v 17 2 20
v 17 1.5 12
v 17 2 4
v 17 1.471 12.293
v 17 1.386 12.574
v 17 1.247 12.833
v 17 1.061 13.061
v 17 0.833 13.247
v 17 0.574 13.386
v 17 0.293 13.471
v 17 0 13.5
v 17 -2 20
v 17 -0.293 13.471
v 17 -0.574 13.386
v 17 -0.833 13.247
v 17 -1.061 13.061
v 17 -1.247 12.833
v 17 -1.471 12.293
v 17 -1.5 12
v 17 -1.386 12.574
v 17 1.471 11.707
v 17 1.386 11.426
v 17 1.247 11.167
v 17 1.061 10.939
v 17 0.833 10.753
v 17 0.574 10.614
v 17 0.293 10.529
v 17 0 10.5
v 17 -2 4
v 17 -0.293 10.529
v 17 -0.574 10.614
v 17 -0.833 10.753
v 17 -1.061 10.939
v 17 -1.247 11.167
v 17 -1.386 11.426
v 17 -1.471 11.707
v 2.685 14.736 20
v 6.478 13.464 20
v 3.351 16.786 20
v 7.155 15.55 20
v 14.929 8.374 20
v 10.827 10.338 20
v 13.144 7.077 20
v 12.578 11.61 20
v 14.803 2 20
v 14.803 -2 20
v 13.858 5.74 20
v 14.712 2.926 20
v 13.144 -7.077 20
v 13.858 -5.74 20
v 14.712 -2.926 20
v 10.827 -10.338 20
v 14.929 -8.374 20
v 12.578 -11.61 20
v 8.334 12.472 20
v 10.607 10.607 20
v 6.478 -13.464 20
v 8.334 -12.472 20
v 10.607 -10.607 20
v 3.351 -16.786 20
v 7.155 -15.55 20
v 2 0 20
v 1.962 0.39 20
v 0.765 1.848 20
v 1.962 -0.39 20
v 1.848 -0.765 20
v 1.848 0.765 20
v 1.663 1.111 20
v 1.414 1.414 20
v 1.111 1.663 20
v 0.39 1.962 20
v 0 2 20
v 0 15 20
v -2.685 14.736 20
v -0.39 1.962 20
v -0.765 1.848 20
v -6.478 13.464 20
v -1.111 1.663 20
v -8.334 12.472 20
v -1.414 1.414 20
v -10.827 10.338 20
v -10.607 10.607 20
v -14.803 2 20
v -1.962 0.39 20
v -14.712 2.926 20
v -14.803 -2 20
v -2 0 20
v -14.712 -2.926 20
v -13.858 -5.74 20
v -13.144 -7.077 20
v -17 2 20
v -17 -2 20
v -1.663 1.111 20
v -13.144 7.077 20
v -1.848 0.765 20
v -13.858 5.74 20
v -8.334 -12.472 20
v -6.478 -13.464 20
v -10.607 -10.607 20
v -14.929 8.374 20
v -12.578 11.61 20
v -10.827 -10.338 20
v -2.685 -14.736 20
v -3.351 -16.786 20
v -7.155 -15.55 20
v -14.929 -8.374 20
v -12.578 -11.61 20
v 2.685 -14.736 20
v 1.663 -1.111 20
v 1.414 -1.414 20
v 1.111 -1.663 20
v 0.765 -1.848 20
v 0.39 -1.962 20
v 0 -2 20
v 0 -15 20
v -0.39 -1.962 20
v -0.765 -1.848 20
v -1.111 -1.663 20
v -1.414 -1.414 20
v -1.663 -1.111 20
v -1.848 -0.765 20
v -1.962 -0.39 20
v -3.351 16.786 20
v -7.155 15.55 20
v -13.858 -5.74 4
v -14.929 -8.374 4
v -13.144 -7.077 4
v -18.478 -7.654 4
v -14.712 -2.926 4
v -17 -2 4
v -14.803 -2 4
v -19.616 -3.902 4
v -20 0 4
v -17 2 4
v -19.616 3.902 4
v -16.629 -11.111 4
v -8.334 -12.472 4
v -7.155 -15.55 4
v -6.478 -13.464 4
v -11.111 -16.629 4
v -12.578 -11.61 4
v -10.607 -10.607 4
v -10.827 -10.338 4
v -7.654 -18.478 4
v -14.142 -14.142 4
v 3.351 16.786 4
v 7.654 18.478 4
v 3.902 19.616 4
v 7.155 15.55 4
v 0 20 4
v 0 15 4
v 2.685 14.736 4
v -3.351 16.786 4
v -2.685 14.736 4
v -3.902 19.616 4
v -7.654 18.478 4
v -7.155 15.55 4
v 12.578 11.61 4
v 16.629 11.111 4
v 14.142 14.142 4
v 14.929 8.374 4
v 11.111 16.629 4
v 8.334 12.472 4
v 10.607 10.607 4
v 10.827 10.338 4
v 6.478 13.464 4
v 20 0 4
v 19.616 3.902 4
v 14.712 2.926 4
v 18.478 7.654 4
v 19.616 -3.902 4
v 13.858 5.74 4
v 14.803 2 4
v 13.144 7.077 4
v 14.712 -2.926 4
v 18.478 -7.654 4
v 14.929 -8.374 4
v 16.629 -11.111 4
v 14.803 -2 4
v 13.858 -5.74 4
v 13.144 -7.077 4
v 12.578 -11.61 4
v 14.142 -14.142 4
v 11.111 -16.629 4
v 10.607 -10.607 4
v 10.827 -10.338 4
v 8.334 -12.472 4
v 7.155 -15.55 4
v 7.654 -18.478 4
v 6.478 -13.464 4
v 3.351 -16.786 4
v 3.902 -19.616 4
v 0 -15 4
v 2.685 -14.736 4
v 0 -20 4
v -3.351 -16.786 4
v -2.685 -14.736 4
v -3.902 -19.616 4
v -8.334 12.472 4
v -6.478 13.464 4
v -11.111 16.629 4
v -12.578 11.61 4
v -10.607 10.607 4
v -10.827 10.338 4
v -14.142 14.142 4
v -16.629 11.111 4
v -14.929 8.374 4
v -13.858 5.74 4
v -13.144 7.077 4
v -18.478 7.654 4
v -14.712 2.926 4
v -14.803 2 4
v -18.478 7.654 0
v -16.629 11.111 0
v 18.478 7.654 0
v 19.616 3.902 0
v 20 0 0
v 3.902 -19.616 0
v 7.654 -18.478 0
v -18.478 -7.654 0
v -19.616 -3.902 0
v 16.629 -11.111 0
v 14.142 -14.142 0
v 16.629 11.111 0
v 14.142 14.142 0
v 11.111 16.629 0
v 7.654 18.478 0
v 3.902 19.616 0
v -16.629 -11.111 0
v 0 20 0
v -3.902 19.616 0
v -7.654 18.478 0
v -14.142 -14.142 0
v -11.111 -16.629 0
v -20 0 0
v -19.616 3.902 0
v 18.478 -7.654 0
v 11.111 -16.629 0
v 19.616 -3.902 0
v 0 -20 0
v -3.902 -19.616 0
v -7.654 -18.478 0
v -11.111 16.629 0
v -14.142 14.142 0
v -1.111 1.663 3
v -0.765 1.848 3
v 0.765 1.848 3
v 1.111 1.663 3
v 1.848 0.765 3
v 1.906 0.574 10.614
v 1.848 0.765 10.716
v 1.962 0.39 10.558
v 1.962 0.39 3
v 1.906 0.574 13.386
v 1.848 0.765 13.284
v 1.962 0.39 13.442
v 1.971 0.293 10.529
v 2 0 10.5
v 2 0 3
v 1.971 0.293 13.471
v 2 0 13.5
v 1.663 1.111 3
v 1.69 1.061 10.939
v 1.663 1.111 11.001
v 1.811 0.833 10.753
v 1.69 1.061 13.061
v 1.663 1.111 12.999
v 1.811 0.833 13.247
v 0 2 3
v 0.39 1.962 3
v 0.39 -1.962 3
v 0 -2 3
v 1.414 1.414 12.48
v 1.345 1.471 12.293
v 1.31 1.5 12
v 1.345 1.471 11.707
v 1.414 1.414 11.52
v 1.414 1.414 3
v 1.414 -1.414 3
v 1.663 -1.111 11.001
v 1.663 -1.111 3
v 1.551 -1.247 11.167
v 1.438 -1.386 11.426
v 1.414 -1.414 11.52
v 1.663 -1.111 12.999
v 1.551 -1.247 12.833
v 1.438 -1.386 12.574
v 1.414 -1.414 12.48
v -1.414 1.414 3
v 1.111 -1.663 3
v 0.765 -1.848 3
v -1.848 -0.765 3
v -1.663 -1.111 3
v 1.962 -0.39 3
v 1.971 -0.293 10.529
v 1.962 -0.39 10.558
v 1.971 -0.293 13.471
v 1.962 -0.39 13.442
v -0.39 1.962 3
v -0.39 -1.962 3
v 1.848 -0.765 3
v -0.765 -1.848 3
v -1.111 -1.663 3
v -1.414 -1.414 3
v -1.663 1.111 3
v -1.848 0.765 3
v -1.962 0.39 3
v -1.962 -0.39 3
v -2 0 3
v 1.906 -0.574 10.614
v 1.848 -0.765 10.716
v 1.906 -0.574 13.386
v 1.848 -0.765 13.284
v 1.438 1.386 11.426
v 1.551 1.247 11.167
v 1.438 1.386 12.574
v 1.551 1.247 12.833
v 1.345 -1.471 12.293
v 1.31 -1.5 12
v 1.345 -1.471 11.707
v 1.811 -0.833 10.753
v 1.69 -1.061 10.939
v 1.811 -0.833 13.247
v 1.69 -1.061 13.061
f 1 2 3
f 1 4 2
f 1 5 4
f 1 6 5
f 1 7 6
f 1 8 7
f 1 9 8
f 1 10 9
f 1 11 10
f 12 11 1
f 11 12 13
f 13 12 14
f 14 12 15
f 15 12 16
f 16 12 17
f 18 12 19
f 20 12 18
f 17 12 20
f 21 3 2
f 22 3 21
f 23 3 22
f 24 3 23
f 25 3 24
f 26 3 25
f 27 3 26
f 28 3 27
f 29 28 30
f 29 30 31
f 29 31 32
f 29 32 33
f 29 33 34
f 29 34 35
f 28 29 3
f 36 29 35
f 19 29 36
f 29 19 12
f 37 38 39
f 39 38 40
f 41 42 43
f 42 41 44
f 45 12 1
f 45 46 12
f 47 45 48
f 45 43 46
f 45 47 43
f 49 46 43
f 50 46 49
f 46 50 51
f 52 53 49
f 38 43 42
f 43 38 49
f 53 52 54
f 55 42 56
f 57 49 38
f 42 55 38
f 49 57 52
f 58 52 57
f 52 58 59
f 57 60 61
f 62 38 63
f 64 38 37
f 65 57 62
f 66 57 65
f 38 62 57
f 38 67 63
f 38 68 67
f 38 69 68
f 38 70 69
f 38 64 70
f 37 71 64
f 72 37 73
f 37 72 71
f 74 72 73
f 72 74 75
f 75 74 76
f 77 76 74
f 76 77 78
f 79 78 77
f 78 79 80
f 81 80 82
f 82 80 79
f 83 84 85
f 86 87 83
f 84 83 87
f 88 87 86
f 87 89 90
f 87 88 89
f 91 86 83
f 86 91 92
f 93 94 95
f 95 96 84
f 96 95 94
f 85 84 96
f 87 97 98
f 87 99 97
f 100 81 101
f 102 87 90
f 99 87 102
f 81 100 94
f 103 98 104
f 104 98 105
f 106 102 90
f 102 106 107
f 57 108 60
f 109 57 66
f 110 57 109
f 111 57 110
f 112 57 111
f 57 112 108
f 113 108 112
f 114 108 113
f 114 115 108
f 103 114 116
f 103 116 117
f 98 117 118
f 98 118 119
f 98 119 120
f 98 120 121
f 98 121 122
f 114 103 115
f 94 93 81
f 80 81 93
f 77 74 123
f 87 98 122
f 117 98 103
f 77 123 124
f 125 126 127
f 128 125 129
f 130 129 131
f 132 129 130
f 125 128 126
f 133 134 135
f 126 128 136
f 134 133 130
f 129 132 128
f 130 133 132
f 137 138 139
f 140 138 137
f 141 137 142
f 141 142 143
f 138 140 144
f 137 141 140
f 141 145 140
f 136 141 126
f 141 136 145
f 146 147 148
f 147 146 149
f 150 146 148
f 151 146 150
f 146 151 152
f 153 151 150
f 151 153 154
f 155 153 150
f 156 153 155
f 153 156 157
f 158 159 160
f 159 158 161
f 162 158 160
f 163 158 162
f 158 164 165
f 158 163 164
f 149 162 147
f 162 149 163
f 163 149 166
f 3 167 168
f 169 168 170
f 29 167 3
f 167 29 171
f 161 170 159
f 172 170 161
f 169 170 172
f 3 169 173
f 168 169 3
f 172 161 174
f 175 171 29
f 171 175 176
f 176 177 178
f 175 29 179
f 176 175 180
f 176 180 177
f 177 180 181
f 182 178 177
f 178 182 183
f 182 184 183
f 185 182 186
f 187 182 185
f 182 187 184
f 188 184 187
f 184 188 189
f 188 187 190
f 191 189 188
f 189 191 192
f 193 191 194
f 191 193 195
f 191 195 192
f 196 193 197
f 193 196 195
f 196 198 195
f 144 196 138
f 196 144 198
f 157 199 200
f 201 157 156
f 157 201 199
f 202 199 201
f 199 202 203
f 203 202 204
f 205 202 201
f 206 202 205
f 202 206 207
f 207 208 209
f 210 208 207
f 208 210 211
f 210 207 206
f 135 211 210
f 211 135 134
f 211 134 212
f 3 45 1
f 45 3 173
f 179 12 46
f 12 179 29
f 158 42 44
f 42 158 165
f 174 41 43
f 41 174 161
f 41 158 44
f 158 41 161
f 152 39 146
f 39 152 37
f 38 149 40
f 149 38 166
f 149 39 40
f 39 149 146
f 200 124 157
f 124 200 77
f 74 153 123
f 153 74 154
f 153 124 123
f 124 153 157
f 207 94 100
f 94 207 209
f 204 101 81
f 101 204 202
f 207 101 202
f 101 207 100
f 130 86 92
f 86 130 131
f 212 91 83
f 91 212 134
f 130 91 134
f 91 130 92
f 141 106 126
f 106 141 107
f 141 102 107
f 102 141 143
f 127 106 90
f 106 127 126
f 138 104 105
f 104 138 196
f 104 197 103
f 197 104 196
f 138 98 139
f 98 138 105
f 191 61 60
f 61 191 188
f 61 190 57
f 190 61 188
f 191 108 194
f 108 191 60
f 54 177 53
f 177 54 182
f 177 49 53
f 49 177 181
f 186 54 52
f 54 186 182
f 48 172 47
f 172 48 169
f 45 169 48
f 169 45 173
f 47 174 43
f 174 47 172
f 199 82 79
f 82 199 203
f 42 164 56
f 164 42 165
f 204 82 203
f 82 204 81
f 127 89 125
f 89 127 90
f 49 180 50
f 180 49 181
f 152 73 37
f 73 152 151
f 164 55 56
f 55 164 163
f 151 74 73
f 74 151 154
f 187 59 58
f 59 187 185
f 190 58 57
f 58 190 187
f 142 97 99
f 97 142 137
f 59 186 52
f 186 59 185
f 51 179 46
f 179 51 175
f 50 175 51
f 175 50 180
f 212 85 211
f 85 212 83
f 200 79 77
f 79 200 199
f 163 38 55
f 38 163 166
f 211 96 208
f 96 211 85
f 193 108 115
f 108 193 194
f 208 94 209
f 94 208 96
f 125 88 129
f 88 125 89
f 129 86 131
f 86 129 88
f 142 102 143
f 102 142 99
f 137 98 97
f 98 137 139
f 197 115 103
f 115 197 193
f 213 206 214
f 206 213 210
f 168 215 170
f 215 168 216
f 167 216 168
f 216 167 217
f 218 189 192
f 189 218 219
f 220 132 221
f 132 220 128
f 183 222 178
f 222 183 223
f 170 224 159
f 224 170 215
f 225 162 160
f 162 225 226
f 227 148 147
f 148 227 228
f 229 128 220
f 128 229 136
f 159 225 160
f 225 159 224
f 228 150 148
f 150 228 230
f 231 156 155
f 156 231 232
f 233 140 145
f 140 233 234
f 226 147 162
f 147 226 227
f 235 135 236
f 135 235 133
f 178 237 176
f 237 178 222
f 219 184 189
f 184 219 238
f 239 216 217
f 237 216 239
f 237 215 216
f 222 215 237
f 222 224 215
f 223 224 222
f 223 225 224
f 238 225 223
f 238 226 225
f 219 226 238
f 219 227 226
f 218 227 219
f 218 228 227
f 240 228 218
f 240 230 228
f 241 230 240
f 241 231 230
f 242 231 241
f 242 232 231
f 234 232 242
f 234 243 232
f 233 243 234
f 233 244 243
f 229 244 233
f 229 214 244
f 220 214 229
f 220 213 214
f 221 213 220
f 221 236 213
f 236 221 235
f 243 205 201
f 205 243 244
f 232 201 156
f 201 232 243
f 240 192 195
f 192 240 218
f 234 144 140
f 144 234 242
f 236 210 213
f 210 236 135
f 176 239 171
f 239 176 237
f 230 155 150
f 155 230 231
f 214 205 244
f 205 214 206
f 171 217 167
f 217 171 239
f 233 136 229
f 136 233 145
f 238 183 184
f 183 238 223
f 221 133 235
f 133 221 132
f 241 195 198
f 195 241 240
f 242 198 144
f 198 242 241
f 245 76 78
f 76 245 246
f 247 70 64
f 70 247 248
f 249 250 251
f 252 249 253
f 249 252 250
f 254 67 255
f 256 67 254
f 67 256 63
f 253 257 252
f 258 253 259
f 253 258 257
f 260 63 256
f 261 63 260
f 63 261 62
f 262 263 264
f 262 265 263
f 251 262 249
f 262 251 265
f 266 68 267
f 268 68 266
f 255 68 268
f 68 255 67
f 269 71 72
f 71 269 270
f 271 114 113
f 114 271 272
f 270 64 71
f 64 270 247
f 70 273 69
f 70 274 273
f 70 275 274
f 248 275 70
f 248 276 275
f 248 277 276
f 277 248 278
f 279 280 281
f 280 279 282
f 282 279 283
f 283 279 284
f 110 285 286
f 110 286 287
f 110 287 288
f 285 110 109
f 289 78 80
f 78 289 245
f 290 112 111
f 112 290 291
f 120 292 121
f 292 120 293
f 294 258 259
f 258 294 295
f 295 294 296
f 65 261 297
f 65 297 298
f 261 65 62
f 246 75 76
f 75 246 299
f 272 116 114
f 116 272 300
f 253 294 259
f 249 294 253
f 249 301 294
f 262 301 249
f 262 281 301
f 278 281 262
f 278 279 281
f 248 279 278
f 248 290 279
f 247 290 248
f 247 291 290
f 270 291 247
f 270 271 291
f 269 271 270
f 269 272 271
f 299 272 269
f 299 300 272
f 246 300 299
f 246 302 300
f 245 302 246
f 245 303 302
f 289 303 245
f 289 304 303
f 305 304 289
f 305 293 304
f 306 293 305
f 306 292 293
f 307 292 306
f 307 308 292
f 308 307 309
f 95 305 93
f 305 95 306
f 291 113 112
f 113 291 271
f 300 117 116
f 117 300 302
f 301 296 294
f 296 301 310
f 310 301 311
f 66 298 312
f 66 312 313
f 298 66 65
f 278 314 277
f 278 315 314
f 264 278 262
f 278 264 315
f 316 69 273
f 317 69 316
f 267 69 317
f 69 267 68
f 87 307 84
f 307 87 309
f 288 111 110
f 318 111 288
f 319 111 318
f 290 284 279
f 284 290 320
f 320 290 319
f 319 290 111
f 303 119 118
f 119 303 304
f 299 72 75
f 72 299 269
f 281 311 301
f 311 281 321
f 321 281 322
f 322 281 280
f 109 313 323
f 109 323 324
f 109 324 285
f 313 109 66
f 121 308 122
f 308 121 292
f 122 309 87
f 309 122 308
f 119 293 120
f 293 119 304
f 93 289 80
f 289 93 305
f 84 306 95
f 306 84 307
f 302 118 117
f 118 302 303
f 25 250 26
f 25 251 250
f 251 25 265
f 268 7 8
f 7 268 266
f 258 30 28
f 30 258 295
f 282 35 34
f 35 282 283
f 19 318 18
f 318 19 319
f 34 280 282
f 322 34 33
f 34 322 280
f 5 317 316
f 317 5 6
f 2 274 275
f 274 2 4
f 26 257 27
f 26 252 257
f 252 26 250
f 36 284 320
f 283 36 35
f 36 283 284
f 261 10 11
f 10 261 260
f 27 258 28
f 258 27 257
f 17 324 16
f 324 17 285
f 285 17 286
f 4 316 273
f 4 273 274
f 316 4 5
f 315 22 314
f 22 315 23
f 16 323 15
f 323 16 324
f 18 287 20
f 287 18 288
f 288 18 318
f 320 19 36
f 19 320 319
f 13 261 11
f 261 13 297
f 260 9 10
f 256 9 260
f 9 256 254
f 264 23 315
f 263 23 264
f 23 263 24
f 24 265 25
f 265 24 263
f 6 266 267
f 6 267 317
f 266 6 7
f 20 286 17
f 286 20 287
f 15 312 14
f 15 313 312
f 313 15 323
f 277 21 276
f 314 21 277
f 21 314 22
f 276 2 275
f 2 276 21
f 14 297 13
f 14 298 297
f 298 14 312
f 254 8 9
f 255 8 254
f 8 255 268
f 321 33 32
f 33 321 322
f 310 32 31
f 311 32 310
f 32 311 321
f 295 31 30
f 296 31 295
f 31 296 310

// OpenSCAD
$fn = 32;

// ----------------------------------------------------------------------
// Control knob: skirt knob with grip ribs
// ----------------------------------------------------------------------

// --- parameters (mm) ---
skirt_d = 40;             // skirt diameter
skirt_t = 4;              // skirt thickness
rib_w = 4;                // grip rib width
rib_out = 3;              // grip rib radial protrusion
n_ribs = 10;              // number of grip ribs
knob_d = 30;              // knob body diameter
knob_h = 16;              // knob body height
bore_d = 4;               // shaft bore diameter
set_d = 3;                // set screw bore diameter

rib_step = 360 / n_ribs;  // rib angular step
total_h = skirt_t + knob_h;  // overall height

difference() {
  union() {
    translate([0, 0, skirt_t]) cylinder(h = knob_h, d = knob_d);
    cylinder(h = skirt_t, d = skirt_d);
    for (i = [0 : n_ribs - 1])
      rotate([0, 0, i * rib_step])
        translate([knob_d / 2 - 1, -rib_w / 2, skirt_t])
          cube([rib_out, rib_w, knob_h]);
  }
  translate([0, 0, skirt_t - 1]) cylinder(h = knob_h + 2, d = bore_d);
  translate([-1, 0, skirt_t + knob_h / 2]) rotate([0, 90, 0])
    cylinder(h = knob_d / 2 + bore_d / 2 + 2, d = set_d);
}
